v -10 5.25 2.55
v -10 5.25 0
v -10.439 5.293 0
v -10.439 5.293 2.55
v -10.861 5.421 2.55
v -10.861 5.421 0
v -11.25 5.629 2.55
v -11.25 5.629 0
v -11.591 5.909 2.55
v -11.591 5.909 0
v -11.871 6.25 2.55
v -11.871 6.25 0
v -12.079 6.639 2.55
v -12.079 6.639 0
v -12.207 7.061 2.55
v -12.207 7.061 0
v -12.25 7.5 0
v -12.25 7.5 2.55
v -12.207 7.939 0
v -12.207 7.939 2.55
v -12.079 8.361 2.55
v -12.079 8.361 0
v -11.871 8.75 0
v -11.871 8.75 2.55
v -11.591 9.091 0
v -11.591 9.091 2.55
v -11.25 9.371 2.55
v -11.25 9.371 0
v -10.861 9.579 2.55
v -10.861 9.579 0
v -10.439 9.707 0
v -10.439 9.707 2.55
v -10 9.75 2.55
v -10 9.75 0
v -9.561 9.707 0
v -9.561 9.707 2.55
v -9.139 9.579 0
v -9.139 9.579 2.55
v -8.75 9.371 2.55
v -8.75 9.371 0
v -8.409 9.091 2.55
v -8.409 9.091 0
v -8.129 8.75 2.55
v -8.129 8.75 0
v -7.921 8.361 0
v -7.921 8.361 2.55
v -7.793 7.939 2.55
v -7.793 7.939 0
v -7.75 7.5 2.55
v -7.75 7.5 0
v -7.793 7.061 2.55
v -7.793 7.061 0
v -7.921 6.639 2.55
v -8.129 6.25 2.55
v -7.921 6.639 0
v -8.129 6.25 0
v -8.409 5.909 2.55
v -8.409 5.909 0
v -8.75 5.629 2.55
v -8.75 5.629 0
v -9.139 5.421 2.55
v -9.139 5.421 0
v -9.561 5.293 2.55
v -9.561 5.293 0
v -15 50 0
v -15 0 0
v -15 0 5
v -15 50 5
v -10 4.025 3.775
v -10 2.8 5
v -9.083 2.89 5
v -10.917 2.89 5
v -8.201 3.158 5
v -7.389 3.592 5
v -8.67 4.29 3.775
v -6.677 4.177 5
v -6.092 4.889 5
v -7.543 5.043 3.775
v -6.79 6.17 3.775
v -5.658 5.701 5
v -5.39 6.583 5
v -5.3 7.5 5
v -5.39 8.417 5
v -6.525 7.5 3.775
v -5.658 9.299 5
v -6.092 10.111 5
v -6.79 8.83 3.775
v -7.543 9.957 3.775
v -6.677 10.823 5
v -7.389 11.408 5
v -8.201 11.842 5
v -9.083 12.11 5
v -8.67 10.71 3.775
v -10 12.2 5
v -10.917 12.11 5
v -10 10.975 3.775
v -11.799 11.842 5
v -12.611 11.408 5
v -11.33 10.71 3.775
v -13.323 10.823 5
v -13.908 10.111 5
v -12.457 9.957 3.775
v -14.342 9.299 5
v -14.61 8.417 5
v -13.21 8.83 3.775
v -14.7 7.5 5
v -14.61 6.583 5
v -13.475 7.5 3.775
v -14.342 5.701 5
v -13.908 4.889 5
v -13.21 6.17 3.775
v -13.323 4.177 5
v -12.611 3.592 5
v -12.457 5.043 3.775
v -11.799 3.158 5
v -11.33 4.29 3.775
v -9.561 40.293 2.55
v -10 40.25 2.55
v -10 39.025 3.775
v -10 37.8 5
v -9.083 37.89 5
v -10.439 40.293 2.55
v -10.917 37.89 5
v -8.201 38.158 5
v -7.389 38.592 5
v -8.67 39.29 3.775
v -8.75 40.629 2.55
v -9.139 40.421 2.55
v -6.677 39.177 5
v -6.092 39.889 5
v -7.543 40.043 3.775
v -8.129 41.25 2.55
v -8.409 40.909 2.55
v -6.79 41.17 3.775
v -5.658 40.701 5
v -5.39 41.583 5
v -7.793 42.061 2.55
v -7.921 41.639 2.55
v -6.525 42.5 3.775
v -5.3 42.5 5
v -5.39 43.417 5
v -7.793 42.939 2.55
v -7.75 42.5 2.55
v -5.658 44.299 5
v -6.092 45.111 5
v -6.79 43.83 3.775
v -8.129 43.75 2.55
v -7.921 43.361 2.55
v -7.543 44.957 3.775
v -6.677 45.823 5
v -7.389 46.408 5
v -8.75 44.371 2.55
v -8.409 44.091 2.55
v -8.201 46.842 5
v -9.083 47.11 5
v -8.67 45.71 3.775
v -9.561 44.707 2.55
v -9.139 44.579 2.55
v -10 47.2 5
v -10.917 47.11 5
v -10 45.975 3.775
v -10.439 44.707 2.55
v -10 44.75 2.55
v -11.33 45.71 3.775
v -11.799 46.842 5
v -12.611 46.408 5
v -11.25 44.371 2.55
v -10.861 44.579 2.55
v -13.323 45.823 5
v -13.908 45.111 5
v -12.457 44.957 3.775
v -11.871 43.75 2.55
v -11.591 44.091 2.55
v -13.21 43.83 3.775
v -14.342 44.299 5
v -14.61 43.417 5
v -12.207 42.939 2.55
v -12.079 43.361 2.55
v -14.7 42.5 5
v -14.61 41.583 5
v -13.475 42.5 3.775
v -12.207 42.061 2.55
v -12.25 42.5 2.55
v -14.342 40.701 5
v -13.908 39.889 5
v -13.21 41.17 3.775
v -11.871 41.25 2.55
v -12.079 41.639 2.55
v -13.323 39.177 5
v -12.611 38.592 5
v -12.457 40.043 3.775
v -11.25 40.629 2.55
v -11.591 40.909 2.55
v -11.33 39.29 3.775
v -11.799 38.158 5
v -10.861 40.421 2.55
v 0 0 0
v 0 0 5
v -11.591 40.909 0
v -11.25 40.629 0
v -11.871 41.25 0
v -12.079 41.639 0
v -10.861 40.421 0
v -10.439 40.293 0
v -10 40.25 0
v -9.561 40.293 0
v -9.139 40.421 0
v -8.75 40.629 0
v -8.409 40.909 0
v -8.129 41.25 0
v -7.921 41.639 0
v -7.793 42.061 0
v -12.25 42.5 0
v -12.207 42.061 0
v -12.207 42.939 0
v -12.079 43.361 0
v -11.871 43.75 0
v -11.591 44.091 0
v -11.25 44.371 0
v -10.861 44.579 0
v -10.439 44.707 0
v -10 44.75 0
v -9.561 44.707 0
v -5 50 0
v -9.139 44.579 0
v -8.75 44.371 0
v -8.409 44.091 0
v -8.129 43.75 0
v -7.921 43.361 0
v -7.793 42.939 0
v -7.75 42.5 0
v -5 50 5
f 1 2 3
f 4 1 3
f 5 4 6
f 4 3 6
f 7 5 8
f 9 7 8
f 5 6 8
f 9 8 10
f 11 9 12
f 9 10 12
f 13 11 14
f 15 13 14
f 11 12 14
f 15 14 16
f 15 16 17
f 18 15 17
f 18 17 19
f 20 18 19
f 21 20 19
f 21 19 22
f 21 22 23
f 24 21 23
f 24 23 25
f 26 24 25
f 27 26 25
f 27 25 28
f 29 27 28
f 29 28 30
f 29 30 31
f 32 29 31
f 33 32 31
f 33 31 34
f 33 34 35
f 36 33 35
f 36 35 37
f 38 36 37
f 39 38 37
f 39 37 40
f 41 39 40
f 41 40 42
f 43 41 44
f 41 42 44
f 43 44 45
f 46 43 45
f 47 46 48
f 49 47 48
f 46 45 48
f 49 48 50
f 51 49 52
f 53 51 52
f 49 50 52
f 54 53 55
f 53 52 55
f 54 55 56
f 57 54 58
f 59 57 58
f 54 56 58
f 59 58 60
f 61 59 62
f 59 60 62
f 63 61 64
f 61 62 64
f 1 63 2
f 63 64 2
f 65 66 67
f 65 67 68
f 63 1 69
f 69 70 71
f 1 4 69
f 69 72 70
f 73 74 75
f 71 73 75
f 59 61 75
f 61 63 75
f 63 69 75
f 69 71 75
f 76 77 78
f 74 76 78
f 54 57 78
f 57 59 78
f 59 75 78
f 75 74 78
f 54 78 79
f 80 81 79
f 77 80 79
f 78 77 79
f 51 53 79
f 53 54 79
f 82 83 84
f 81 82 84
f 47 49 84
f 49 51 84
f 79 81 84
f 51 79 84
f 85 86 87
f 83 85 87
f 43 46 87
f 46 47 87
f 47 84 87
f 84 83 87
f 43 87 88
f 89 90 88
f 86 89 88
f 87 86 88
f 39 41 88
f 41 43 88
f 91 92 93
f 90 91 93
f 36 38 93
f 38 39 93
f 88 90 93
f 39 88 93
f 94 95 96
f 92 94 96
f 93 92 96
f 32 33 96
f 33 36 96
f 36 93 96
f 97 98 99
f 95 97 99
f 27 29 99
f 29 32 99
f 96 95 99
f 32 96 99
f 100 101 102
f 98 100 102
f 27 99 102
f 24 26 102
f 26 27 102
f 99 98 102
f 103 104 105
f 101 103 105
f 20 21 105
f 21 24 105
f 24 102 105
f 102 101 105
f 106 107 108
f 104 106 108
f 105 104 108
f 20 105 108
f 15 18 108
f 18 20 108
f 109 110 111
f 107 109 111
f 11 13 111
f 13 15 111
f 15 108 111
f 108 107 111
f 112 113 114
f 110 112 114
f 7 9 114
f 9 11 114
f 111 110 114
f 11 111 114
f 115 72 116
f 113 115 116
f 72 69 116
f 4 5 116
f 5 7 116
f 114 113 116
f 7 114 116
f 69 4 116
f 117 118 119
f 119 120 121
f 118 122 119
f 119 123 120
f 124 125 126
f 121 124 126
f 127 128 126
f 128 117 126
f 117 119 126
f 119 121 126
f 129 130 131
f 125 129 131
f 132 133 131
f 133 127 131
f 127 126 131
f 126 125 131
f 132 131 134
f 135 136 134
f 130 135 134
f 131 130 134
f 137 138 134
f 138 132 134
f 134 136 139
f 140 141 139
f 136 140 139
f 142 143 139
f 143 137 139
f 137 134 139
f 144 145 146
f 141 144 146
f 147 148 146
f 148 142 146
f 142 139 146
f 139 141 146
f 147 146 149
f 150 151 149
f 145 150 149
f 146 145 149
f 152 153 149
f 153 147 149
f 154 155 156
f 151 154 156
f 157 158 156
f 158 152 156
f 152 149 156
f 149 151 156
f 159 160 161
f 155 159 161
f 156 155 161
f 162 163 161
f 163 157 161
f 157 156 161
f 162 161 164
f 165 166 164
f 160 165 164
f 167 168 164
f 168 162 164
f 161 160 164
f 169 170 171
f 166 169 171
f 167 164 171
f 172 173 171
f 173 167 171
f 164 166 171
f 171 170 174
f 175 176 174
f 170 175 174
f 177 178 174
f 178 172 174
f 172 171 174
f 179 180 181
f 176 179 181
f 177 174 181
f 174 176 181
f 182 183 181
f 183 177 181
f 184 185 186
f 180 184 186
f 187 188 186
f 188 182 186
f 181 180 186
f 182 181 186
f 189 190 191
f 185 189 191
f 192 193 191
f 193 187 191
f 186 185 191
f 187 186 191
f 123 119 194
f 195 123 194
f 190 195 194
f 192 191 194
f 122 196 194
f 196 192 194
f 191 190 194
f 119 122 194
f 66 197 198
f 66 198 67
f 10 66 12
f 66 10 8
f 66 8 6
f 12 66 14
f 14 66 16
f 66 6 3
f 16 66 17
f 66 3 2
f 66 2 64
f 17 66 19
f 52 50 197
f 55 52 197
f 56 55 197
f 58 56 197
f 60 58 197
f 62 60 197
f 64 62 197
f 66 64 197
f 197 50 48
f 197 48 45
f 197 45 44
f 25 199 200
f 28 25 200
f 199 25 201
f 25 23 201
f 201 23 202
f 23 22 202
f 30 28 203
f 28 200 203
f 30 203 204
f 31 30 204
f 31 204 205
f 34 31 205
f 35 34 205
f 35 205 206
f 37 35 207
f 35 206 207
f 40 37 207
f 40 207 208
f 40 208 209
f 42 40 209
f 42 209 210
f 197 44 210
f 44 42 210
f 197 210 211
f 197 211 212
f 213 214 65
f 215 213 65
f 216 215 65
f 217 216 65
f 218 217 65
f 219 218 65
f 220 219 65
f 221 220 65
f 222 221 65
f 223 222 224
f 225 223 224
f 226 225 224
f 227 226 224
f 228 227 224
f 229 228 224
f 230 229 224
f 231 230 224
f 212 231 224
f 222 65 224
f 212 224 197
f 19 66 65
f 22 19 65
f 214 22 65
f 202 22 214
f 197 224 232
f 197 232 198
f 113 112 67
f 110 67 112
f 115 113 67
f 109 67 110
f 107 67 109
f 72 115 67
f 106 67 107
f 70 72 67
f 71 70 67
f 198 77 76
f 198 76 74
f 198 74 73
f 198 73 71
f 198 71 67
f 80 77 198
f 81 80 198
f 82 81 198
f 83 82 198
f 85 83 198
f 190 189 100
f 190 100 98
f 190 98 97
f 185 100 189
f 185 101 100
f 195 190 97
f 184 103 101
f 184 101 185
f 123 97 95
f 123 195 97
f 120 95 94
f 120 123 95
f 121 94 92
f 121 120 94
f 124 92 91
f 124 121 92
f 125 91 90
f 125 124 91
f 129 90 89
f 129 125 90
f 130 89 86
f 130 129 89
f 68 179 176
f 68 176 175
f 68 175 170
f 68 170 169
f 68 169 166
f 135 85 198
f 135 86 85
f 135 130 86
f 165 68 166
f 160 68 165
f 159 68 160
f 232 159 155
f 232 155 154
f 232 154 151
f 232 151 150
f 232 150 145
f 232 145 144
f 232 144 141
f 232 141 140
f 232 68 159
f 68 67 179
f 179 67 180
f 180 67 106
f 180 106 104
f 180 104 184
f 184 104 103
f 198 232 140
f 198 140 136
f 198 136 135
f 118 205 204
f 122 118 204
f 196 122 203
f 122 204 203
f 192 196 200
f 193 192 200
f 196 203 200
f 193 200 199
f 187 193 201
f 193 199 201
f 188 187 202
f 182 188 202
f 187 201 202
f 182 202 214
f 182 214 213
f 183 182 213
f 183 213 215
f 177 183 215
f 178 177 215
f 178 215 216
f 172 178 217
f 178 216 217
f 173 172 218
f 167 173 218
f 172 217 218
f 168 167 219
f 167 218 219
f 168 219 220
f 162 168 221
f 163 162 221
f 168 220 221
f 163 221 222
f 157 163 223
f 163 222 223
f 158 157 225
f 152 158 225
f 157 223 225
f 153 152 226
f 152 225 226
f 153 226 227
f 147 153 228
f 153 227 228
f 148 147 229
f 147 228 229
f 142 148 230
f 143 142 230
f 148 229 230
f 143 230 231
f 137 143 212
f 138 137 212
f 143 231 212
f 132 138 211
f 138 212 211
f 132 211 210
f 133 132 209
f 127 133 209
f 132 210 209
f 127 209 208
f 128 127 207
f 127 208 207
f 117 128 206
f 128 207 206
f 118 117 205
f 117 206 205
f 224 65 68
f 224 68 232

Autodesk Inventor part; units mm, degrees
ref_plane "YZ Plane" through (0, 0, 0) normal (1, 0, 0) x (0, 1, 0)
ref_plane "XZ Plane" through (0, 0, 0) normal (0, 1, 0) x (-1, 0, 0)
ref_plane "XY Plane" through (0, 0, 0) normal (0, 0, 1) x (1, 0, 0)
sketch "Sketch1" plane through (0, 0, 0) normal (0, 0, 1) x (1, 0, 0)
  line L0 (0, 0) -> (-15, 0)
  line L1 (-15, 0) -> (-15, 50)
  line L2 (-15, 50) -> (-5, 50)
  line L3 (-5, 50) -> (0, 0)
  dimension "d0" = 10
  dimension "d1" = 50
  dimension "d16" = 15
extrude "Extrusion1" add sketch "Sketch1" along normal blind 5
sketch "Sketch2" plane through (0, 0, 5) normal (0, 0, 1) x (1, 0, 0)
  line L0 (-15, 50) -> (-15, 0) projected
  line L1 (-5, 50) -> (-15, 50) projected
  line L2 (-15, 0) -> (0, 0) projected
  point P0 (-10, 42.5)
  point P1 (-10, 7.5)
  dimension "d6" = 7.5
  dimension "d7" = 7.5
  dimension "d8" = 35
  dimension "d17" = 5
hole "Hole1" at (-10, 42.5, 5) at (-10, 7.5, 5) direction (0, 0, -1) diameter 4.5 end through all countersink diameter 9.4 countersink angle 90 clearance for "Flat Head Machine Screw" size "M4" standard "Ansi Metric M Profile"
equation "\"d7\" = d6"
properties part number "Pancake_Side Piece Short 3" material "Wood (Birch)"
